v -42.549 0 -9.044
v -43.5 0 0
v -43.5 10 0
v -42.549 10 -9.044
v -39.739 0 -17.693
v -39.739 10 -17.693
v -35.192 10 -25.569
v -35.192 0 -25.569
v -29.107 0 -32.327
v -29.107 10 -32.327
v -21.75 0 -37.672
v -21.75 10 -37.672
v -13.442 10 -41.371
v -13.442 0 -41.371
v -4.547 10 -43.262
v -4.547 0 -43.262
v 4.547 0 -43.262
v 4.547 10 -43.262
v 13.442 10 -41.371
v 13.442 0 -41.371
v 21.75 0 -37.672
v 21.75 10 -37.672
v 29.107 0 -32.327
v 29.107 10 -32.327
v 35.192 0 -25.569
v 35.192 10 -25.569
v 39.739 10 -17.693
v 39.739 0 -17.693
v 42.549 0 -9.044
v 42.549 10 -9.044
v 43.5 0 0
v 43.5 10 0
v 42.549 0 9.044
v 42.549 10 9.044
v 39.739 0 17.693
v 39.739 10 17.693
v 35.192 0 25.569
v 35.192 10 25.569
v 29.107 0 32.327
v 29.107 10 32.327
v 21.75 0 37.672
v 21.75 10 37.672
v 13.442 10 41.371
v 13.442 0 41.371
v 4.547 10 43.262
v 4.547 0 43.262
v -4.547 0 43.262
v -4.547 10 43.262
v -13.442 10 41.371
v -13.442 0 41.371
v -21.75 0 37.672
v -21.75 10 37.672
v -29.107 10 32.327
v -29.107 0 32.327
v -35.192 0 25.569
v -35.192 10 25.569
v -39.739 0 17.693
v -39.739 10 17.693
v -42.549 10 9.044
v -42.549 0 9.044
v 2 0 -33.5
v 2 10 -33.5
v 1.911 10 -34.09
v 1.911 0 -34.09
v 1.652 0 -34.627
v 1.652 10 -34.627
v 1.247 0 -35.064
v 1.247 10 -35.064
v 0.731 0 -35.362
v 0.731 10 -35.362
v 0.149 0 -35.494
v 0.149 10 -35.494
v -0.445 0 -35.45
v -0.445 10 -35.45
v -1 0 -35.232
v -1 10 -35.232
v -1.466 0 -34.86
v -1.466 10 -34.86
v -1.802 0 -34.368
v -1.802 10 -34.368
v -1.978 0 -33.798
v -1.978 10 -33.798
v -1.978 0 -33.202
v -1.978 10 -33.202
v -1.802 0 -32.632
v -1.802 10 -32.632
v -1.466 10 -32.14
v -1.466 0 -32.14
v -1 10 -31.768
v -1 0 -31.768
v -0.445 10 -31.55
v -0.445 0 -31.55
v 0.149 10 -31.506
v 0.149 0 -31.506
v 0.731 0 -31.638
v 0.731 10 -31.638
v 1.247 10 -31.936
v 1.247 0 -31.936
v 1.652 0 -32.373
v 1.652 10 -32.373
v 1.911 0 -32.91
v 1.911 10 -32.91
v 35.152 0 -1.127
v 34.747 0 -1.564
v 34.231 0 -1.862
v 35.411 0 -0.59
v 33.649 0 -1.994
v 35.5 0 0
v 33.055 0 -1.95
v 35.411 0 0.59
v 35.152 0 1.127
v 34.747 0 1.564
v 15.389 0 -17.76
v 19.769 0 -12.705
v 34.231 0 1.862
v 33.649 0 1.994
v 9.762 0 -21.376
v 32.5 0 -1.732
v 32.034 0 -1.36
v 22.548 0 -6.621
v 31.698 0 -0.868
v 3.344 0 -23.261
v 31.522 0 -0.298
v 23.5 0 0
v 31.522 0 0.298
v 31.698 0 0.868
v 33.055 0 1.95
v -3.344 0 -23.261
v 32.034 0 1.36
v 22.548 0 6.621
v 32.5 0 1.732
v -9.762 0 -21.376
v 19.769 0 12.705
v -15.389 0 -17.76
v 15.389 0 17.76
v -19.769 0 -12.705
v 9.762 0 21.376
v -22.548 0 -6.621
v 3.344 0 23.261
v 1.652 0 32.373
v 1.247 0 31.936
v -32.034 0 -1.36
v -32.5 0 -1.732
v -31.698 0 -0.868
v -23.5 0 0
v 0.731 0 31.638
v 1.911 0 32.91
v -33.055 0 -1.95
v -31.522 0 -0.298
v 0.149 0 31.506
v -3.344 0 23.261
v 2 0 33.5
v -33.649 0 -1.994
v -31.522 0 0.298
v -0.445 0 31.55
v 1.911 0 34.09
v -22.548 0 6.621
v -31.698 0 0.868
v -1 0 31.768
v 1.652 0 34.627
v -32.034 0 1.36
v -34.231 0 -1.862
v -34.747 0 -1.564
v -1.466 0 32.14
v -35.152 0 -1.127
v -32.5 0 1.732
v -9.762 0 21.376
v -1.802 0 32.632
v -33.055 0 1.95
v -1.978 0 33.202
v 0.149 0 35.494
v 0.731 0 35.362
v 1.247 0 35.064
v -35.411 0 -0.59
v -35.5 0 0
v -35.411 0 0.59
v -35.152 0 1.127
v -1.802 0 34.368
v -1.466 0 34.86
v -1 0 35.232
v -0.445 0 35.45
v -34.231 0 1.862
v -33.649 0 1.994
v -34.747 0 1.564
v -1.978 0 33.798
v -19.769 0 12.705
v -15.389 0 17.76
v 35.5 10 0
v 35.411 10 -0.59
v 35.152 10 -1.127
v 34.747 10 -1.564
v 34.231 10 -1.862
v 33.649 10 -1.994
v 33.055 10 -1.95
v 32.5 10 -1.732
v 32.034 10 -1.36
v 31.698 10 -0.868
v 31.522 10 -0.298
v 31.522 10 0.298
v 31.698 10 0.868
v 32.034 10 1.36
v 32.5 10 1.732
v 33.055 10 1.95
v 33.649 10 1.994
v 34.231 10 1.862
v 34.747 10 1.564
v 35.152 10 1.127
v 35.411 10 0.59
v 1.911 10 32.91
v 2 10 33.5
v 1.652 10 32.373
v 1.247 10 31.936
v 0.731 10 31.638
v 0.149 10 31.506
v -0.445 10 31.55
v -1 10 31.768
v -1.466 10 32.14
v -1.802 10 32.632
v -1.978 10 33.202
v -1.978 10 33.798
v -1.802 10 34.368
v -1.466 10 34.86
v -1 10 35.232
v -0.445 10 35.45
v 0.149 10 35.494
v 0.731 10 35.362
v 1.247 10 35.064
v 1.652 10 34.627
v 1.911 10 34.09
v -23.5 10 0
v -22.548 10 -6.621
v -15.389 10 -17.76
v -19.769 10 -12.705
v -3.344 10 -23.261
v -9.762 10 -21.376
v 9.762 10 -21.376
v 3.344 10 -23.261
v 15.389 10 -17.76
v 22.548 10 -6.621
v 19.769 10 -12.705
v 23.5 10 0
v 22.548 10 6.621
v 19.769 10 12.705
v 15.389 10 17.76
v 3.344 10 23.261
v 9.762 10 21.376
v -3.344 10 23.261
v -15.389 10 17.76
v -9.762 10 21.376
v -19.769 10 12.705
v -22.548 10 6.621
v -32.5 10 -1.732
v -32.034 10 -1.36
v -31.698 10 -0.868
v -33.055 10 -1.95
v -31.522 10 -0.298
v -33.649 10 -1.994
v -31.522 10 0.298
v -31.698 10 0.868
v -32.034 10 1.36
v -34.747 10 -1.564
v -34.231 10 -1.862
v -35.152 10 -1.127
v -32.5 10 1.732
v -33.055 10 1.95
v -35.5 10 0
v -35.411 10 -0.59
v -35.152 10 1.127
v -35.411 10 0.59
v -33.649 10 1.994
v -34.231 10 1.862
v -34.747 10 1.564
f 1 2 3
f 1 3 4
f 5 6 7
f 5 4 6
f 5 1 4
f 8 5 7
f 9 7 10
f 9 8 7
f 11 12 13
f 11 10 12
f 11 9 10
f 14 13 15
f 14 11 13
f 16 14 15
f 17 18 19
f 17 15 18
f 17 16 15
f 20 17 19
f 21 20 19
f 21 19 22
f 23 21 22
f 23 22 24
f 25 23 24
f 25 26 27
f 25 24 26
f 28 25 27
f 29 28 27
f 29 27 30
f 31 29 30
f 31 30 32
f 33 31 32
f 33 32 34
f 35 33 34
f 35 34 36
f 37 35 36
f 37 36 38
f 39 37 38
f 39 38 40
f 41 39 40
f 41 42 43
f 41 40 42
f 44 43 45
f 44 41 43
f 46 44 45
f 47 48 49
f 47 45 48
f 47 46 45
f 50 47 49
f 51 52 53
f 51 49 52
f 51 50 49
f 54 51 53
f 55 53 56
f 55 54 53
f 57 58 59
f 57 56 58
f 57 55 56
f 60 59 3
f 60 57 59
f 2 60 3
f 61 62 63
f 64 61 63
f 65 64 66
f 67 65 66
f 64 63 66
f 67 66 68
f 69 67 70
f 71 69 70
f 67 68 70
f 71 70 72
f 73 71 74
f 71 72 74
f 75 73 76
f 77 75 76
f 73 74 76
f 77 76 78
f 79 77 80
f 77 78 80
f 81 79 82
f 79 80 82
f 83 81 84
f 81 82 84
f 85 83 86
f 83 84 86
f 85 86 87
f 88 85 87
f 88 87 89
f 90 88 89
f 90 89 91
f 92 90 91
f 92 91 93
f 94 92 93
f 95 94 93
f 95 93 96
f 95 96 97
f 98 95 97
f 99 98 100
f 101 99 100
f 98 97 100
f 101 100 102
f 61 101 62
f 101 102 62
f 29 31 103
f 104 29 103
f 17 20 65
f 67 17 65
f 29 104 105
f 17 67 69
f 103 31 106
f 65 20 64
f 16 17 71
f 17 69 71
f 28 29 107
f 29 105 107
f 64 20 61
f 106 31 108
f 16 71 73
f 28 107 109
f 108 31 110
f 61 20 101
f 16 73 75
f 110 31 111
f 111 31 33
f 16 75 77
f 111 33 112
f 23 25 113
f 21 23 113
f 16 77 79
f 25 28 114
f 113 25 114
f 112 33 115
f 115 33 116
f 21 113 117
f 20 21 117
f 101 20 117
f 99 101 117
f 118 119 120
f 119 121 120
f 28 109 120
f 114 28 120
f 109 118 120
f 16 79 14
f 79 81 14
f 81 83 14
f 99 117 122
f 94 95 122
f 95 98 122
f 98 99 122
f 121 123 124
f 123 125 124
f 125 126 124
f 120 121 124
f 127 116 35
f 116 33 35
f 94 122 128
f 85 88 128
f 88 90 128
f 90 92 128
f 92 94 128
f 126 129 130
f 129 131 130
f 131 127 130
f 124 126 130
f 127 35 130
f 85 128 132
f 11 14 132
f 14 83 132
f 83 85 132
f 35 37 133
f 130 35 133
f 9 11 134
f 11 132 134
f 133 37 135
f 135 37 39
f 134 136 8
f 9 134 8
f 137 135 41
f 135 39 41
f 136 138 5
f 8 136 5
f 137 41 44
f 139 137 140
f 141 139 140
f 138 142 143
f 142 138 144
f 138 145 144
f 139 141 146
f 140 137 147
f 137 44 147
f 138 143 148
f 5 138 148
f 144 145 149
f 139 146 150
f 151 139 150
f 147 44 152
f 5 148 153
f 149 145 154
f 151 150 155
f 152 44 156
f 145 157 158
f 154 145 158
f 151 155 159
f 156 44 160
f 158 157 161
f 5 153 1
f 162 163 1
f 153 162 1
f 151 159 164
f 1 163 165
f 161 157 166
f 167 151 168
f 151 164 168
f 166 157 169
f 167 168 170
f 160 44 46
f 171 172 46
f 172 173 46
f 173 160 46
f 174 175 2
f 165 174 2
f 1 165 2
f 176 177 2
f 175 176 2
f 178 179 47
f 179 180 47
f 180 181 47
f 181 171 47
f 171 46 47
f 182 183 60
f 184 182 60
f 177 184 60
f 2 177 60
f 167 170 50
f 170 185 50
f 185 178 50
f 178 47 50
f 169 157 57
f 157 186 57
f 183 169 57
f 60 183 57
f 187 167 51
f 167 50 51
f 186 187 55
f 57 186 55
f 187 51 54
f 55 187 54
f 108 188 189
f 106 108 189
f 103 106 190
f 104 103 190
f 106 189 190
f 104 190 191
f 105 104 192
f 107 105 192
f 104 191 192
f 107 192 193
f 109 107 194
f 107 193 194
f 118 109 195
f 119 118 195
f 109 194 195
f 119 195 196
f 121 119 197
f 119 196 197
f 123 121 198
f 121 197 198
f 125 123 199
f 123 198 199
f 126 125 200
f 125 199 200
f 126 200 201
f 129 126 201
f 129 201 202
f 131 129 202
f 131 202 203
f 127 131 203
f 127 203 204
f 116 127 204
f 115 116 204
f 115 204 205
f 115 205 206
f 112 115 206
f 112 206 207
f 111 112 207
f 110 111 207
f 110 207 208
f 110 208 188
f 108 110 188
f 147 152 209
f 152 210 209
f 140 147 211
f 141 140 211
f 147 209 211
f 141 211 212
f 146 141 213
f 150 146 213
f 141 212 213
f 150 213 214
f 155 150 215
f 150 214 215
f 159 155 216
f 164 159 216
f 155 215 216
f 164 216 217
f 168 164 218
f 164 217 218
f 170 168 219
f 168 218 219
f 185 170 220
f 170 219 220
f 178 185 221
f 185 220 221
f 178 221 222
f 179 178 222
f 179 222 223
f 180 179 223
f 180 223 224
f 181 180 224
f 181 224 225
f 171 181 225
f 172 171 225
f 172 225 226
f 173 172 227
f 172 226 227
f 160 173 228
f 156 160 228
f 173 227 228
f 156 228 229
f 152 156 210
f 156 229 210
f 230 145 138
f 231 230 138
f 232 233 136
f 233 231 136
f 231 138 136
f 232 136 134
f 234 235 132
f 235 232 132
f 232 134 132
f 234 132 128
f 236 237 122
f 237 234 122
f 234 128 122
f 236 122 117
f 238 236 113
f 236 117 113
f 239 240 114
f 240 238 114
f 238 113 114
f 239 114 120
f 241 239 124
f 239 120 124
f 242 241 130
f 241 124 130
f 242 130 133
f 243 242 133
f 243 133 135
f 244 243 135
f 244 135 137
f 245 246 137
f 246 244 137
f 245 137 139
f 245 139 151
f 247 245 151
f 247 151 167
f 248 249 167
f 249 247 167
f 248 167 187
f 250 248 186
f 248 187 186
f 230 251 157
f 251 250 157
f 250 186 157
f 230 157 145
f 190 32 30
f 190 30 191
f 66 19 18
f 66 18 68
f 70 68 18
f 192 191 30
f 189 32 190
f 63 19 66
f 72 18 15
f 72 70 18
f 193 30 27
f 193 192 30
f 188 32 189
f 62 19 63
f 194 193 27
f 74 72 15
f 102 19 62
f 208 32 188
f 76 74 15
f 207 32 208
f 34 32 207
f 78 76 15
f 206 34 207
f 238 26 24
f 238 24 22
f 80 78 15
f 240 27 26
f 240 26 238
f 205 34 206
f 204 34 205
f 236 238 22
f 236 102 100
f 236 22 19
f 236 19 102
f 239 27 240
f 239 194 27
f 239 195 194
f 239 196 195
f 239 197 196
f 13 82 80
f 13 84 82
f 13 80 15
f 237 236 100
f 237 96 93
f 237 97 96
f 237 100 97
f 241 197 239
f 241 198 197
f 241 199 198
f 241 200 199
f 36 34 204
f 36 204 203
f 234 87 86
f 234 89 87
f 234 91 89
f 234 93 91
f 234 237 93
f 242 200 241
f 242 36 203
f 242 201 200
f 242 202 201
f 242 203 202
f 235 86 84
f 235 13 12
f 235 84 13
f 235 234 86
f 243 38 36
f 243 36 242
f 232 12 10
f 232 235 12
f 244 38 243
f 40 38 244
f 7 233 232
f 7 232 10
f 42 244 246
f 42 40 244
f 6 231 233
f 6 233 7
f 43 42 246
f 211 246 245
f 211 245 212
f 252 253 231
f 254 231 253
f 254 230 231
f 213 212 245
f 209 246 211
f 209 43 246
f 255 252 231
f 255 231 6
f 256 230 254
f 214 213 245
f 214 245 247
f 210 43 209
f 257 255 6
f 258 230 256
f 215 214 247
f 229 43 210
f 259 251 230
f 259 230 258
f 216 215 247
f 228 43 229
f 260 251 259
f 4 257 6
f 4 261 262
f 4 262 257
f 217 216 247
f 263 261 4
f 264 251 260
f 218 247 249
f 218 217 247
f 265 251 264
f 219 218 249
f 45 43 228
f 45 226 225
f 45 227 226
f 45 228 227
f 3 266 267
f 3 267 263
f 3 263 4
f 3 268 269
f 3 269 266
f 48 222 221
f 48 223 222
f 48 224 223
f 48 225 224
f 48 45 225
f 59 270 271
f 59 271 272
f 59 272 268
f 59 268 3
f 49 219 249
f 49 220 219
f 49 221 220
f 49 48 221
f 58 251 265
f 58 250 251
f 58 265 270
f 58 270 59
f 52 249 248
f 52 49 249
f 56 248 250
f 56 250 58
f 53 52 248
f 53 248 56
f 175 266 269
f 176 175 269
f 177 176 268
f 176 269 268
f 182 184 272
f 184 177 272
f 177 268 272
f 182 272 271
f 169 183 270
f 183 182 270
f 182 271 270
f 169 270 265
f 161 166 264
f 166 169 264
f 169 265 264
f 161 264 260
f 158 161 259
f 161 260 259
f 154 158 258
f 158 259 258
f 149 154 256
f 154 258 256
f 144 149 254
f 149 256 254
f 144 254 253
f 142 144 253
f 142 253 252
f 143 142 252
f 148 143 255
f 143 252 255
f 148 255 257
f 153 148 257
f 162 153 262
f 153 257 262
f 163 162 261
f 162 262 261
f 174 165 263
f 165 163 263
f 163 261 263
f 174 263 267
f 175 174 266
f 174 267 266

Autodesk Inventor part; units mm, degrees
ref_plane "YZ Plane" through (0, 0, 0) normal (1, 0, 0) x (0, 1, 0)
ref_plane "XZ Plane" through (0, 0, 0) normal (0, 1, 0) x (-1, 0, 0)
ref_plane "XY Plane" through (0, 0, 0) normal (0, 0, 1) x (1, 0, 0)
sketch "Sketch1" plane through (0, 0, 0) normal (0, 1, 0) x (-1, 0, 0)
  circle A0 centre (0, 0) radius 23.5
  circle A1 centre (0, 0) radius 43.5
  dimension "d0" = 47
  dimension "d1" = 87
extrude "Extrusion1" add sketch "Sketch1" along normal blind 10
sketch "Sketch2" plane through (0, 10, 0) normal (0, 1, 0) x (1, 0, 0)
  circle A0 centre (33.5, 0) radius 2
  point P0 (0, 0)
  dimension "d4" = 4
extrude "Extrusion2" cut sketch "Sketch2" against normal blind 10
mirror "Mirror1" about plane through (0, 0, 0) normal (1, 0, 0) of "Extrusion2"
sketch "Sketch3" plane through (0, 10, 0) normal (0, 1, 0) x (1, 0, 0)
  circle A0 centre (0, 33.5) radius 2
  circle A1 centre (0, -33.5) radius 2
  point P0 (0, 0)
  dimension "d7" = 4
  dimension "d8" = 4
extrude "Extrusion3" cut sketch "Sketch3" against normal blind 10
ref_plane "Work Plane1" through (0, 0, 0) normal (0, -1, 0) x (1, 0, 0)
properties part number "horizontal_lower_bearing_holder"
